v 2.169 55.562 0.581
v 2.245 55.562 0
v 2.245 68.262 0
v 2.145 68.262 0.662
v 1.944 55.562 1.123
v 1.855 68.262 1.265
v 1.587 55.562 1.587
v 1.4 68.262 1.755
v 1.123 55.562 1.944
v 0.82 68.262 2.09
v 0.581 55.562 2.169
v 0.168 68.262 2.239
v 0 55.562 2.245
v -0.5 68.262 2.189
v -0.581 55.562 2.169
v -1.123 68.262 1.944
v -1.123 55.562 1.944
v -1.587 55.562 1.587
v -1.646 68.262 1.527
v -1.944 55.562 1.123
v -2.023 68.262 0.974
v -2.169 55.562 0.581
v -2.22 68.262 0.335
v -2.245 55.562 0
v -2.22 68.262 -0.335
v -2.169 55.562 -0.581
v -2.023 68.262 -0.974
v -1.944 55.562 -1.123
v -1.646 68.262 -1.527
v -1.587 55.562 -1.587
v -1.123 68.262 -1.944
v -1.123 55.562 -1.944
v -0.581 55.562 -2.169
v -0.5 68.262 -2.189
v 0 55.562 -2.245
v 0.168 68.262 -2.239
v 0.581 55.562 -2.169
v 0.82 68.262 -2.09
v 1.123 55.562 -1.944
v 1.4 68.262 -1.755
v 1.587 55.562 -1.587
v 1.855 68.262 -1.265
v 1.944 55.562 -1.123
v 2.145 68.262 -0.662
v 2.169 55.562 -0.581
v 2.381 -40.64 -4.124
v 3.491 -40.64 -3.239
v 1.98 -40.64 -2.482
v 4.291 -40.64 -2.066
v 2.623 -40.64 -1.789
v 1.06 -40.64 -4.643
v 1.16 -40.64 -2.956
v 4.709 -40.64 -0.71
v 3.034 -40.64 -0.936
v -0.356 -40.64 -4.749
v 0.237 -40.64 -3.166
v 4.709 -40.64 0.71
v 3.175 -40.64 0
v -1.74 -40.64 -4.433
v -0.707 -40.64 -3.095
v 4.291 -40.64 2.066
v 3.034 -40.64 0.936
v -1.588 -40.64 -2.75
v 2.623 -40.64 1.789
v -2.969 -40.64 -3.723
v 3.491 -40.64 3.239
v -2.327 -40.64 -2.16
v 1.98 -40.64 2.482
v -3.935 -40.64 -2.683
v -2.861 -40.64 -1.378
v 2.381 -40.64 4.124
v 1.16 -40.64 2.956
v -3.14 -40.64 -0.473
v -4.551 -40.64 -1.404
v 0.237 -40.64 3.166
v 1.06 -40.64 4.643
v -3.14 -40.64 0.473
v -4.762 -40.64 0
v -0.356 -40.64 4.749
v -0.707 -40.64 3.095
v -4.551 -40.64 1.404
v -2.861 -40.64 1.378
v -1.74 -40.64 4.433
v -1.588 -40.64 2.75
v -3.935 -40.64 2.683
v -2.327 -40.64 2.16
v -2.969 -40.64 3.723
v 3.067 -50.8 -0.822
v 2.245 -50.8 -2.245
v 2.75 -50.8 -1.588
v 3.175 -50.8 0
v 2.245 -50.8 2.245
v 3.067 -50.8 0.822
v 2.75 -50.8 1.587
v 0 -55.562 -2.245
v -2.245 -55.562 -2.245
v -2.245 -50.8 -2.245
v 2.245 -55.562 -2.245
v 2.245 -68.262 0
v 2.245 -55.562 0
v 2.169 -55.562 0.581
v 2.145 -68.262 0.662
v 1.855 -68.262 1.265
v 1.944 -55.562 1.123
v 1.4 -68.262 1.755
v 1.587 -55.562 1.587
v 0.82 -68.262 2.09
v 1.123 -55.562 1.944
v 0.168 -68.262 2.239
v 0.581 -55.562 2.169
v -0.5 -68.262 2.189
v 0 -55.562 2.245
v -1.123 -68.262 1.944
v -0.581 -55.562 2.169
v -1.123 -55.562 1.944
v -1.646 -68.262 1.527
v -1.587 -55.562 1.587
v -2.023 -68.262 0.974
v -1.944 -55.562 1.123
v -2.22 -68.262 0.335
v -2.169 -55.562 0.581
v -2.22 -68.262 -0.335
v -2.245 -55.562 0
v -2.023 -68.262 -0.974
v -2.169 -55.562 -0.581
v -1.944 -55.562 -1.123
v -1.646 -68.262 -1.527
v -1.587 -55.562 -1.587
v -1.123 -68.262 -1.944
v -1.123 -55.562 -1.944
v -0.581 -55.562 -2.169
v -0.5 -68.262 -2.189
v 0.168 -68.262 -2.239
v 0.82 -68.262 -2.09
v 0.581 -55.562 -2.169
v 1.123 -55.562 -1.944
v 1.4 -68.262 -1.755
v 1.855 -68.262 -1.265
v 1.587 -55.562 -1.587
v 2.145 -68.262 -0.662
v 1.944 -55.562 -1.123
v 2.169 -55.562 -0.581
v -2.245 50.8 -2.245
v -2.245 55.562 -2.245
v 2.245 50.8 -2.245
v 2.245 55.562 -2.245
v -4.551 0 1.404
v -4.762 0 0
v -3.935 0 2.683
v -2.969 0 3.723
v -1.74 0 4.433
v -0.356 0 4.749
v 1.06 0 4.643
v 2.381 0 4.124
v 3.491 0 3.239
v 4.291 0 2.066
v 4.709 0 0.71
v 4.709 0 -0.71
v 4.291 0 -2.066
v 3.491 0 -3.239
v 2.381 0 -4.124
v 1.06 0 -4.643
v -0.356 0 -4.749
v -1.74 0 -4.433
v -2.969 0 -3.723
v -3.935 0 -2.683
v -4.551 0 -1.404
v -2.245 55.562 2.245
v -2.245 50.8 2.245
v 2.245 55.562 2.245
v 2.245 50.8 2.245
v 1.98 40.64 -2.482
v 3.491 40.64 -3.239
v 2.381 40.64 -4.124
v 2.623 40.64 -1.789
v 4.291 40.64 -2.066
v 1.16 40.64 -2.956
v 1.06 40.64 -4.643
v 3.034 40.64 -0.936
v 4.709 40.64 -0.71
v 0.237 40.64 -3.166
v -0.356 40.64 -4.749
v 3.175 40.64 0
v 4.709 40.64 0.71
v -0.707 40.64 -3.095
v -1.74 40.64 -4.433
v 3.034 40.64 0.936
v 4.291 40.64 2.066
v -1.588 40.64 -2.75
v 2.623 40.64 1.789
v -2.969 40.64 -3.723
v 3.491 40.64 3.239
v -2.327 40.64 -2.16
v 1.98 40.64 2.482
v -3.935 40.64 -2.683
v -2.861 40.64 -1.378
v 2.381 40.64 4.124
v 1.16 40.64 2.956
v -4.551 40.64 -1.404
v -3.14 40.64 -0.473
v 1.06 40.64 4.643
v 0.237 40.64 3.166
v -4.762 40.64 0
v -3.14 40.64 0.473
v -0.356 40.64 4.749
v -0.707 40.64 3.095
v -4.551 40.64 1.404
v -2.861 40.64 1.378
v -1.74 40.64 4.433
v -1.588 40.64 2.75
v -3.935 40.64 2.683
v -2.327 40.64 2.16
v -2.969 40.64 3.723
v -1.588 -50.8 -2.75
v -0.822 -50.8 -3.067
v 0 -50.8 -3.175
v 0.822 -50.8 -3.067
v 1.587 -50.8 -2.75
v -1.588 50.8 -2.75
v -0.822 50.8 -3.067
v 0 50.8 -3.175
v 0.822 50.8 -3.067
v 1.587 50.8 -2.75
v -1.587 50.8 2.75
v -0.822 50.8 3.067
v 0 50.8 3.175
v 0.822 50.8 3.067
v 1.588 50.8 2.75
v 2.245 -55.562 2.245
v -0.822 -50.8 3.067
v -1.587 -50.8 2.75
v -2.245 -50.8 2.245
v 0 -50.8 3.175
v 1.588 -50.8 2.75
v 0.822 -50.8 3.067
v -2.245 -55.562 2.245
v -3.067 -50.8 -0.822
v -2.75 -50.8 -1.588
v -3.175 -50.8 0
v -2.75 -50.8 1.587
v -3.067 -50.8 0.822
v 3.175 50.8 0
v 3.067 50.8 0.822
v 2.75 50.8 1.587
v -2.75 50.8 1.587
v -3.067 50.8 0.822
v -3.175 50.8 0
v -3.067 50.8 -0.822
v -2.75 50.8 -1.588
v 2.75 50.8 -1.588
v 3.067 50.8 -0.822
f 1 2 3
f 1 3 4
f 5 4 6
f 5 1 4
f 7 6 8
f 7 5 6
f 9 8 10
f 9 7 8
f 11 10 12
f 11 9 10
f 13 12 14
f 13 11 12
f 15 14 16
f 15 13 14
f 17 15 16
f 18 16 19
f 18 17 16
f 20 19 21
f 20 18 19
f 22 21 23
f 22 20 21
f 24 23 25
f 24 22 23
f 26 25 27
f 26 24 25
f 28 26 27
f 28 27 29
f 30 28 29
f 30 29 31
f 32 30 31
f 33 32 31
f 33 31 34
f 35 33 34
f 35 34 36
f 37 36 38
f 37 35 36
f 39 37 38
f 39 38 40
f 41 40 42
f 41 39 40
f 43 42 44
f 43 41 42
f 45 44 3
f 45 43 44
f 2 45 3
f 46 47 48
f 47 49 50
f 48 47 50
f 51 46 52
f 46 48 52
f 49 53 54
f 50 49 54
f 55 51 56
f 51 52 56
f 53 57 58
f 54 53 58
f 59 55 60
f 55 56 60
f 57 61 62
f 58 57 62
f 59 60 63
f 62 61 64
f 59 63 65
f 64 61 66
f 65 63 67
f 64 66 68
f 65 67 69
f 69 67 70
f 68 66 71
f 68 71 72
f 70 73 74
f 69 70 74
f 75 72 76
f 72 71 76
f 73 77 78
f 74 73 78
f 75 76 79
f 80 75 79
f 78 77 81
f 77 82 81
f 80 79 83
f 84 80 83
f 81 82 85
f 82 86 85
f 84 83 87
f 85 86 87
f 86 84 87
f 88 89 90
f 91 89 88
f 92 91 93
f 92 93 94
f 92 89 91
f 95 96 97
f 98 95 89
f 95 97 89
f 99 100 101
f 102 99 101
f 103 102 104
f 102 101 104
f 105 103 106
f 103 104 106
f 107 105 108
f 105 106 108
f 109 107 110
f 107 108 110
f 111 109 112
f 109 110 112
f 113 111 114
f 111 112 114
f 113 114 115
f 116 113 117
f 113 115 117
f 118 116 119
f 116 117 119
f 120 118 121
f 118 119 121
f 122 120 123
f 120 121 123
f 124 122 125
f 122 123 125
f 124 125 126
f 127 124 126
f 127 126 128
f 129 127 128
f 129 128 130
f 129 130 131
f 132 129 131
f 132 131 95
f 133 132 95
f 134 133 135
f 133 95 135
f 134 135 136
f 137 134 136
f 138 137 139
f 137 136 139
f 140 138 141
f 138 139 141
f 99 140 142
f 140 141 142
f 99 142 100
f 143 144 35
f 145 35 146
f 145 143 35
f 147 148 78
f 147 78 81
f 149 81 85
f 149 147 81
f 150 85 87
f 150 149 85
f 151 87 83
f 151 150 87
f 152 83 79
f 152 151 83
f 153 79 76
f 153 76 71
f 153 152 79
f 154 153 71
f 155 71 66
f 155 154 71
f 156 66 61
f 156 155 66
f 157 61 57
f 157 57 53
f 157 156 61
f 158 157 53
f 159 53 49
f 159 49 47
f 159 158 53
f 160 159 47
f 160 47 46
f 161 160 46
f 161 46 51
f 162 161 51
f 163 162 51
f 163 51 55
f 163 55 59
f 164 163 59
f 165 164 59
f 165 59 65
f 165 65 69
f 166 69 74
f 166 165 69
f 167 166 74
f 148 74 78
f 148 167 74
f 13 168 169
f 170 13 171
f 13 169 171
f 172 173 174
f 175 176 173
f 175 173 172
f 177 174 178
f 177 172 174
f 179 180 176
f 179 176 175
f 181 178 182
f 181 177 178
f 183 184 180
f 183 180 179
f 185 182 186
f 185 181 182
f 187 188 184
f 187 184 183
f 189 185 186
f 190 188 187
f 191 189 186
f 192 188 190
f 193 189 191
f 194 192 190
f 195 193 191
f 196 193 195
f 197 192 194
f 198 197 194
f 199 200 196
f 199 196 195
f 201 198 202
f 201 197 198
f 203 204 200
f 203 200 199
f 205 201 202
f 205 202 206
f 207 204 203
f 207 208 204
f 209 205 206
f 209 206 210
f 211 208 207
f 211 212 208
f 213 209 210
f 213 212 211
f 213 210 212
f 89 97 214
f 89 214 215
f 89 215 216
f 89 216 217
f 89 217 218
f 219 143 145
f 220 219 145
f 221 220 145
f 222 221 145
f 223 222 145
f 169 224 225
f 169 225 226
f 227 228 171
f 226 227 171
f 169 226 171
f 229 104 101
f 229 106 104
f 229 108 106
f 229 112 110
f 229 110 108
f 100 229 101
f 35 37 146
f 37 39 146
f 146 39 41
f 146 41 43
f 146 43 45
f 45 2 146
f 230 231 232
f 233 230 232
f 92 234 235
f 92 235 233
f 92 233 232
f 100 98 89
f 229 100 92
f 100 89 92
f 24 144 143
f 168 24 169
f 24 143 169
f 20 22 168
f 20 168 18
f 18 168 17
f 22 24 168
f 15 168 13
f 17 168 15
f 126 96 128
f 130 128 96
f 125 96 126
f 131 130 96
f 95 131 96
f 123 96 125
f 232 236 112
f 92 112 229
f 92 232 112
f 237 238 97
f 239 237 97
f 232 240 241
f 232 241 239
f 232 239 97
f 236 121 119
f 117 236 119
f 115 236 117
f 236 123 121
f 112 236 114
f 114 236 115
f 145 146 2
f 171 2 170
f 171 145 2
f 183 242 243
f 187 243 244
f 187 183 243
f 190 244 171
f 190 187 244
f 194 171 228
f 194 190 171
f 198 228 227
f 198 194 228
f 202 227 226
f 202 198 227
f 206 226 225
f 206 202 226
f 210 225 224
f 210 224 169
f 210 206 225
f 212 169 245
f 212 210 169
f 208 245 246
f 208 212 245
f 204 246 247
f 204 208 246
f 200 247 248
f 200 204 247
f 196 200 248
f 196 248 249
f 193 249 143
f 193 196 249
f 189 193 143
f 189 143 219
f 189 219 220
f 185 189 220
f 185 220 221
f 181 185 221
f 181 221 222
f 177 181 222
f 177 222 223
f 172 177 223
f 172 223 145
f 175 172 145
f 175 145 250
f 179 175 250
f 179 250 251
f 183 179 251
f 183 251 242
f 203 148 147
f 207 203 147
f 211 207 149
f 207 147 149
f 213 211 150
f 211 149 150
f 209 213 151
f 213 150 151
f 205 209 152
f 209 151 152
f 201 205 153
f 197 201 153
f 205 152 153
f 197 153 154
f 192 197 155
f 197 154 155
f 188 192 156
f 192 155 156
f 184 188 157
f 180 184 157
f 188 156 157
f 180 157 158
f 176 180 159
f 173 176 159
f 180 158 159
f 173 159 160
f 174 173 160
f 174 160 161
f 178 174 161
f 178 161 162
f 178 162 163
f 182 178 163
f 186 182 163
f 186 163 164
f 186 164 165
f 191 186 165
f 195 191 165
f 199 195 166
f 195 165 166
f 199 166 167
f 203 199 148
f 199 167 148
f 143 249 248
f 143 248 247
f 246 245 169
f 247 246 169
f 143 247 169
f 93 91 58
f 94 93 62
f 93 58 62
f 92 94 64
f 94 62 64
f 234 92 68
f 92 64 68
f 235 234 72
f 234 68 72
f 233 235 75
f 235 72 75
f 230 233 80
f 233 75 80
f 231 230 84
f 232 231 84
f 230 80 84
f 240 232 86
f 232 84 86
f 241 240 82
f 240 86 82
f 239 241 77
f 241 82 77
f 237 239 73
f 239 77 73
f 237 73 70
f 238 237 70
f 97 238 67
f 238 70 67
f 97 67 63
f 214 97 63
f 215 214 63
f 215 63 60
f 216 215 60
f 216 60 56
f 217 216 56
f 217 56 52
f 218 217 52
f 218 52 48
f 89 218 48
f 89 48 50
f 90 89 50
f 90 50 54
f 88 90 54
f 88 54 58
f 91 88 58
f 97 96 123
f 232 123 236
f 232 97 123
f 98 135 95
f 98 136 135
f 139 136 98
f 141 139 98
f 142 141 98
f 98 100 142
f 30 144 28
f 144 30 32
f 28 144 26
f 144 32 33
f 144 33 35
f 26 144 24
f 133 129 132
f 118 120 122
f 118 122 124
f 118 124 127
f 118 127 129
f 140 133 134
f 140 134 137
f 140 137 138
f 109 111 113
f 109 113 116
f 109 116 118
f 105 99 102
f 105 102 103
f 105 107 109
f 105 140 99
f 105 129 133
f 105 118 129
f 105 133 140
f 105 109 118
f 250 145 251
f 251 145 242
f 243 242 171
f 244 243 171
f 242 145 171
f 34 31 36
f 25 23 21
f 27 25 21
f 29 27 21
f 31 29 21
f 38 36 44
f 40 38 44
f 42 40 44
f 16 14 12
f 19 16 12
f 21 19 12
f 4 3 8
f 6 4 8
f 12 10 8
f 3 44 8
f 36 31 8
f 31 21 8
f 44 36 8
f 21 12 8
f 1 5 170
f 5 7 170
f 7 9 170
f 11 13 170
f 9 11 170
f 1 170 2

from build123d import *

# Parameters (mm, degrees)
F0_R     = 3.175
F1_DEPTH = 50.8
F2_W     = 4.490128
F2_H     = 4.490128
F3_DEPTH = 4.7625
F4_R     = 2.245064
F5_DEPTH = 12.7
F6_R     = 4.7625
F7_DEPTH = 40.64


with BuildPart() as f1:
    # F0 (on Front) → F1 (new body)
    with BuildSketch(Plane.XZ):
        Circle(F0_R)
    extrude(amount=F1_DEPTH)

    # F2 (on face) → F3 (join)
    with BuildSketch(Plane.XZ.offset(50.8)):
        Rectangle(F2_W, F2_H)
    extrude(amount=F3_DEPTH)

    # F4 (on face) → F5 (join)
    with BuildSketch(Plane.XZ.offset(55.5625)):
        Circle(F4_R)
    extrude(amount=F5_DEPTH)

    # F6 (on face) → F7 (join)
    with BuildSketch(Plane(origin=(0, 0, 0), x_dir=(-1, 0, 0), z_dir=(0, 1, 0))):
        Circle(F6_R)
    extrude(amount=-F7_DEPTH)

    # F8: F1 across plane


with BuildPart() as f1_1:
    add(f1.part)
    add(f1.part.mirror(Plane.XZ))


solid = f1_1.part
